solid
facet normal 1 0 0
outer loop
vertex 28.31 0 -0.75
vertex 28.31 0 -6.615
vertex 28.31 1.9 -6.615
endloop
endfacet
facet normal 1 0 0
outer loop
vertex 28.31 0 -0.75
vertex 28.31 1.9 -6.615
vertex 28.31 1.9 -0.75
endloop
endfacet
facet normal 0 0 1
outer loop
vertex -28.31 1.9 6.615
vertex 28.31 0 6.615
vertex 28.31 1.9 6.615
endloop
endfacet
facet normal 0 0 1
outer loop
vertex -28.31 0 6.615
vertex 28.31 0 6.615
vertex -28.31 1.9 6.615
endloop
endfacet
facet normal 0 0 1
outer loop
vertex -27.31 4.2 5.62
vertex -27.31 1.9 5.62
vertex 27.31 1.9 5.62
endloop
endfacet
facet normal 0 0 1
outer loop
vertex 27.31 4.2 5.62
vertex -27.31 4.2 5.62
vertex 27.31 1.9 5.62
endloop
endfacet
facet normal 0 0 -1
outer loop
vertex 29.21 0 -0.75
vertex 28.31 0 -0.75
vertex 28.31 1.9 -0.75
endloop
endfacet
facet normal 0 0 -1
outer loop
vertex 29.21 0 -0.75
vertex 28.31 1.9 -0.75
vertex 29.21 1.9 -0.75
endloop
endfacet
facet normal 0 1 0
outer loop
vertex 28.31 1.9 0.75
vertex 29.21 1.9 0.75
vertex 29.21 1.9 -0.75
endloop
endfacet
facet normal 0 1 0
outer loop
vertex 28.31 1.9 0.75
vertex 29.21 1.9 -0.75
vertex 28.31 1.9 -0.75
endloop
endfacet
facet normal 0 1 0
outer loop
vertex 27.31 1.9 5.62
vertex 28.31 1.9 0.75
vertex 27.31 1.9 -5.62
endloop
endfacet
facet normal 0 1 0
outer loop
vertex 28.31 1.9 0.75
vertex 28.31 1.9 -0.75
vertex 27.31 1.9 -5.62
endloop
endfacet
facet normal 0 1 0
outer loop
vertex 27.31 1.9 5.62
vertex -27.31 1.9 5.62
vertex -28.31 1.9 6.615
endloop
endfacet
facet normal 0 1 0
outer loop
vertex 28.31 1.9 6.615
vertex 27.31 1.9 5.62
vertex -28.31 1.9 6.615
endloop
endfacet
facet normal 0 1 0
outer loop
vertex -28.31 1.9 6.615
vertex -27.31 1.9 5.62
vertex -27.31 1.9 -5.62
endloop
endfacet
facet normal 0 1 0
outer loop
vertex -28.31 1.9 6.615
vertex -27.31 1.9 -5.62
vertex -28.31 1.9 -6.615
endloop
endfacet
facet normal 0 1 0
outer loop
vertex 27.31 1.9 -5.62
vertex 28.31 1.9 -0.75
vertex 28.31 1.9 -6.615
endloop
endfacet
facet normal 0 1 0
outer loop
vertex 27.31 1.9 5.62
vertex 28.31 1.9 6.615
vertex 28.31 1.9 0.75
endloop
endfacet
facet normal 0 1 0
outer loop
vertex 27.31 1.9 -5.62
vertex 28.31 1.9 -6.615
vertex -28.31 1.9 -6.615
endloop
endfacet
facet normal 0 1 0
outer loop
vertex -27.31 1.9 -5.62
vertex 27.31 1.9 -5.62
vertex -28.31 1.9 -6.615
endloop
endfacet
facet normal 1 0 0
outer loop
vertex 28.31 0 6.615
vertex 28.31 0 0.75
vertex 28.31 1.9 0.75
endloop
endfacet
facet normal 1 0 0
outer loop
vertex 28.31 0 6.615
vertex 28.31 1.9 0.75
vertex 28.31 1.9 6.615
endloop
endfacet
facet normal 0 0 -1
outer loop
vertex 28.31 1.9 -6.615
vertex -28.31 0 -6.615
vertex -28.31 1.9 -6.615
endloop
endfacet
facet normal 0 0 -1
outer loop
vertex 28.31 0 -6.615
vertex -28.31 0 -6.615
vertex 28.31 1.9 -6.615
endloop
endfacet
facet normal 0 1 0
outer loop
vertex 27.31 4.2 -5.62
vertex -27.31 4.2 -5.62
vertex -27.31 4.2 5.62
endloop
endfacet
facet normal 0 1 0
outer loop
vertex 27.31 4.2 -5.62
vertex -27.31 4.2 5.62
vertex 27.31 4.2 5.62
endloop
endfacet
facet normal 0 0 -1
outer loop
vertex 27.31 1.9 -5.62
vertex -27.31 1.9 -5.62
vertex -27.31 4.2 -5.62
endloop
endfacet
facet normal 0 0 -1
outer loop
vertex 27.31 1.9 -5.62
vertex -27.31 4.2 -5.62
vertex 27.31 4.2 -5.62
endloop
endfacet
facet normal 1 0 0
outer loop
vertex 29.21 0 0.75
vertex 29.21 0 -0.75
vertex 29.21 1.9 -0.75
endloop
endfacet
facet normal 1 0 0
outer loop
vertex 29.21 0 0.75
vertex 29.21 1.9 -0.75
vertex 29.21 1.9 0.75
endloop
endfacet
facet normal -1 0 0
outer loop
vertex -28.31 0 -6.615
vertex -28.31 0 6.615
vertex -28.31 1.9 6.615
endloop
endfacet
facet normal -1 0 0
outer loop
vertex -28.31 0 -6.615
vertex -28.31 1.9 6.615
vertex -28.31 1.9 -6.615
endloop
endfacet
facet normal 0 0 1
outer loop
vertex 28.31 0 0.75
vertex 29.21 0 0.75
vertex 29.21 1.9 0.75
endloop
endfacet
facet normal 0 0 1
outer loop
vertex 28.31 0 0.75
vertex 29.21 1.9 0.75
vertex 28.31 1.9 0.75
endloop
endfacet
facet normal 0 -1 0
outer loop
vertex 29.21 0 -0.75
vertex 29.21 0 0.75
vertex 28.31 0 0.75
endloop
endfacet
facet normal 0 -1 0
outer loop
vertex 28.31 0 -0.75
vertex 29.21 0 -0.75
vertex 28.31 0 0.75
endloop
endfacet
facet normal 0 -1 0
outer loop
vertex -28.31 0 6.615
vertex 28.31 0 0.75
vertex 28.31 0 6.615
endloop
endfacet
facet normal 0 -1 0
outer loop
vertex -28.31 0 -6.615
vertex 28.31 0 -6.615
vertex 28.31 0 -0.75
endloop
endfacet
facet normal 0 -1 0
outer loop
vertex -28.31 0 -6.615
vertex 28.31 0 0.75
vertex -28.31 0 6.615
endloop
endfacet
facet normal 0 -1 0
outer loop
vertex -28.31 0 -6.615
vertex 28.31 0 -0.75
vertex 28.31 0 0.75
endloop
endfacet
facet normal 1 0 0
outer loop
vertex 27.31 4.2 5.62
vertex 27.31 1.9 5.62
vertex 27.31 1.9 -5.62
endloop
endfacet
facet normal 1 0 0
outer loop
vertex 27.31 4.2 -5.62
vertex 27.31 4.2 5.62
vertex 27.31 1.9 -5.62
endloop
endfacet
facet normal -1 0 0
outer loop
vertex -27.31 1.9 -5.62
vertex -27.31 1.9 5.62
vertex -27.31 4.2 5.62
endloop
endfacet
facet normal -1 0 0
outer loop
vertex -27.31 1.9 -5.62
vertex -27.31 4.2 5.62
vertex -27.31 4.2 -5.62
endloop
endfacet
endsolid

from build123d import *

# Parameters (mm, degrees)
BOSS_EXTRUDE1_DEPTH = 1.9
SKETCH2_W           = 54.62
SKETCH2_H           = 11.24
BOSS_EXTRUDE2_DEPTH = 2.3


with BuildPart() as part:
    # Sketch1 → Boss-Extrude1 (new body)
    with BuildSketch(Plane(origin=(0, 0, 0), x_dir=(1, 0, 0), z_dir=(0, 1, 0))):
        Polygon((28.31, 6.615), (28.31, 0.75), (29.21, 0.75), (29.21, -0.75), (28.31, -0.75), (28.31, -6.615), (-28.31, -6.615), (-28.31, 6.615), align=None)
    extrude(amount=BOSS_EXTRUDE1_DEPTH)

    # Sketch2 → Boss-Extrude2 (add)
    with BuildSketch(Plane(origin=(0, 1.9, 0), x_dir=(1, 0, 0), z_dir=(0, 1, 0))):
        Rectangle(SKETCH2_W, SKETCH2_H)
    extrude(amount=BOSS_EXTRUDE2_DEPTH)


solid = part.part
